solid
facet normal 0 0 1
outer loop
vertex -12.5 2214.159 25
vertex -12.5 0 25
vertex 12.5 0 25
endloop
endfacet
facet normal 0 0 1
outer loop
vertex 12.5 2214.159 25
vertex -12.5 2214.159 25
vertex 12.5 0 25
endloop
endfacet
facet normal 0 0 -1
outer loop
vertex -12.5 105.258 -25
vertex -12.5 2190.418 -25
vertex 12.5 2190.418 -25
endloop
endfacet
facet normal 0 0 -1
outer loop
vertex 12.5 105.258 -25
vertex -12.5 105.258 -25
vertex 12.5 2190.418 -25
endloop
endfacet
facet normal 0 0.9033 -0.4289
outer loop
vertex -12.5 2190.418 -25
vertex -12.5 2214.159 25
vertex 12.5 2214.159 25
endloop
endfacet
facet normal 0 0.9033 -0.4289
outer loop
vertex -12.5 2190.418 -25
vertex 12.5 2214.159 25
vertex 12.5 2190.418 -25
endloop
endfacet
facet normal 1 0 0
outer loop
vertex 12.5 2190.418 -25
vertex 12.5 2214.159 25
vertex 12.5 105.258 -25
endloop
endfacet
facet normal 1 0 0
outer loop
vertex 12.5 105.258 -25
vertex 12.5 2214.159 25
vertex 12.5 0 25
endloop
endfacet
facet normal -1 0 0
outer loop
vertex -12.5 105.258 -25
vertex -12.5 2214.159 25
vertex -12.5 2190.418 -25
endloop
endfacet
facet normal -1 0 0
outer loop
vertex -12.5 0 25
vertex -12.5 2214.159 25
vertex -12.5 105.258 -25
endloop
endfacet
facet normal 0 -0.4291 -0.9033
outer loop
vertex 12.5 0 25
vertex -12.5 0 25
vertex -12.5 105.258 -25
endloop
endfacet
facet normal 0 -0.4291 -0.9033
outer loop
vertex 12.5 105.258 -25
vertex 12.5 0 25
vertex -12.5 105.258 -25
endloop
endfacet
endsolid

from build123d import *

# Parameters (mm, degrees)
SKETCH_1_W          = 25
SKETCH_1_H          = 50
EXTRUDE_1_DEPTH     = 2214.15898255
CUT_EXTRUDE_2_DEPTH = 50
CUT_EXTRUDE_3_DEPTH = 50


with BuildPart() as part:
    # Эскиз1 → Бобышка-Вытянуть1 (new body)
    with BuildSketch(Plane(origin=(0, 0, 0), x_dir=(1, 0, 0), z_dir=(0, 1, 0))):
        Rectangle(SKETCH_1_W, SKETCH_1_H)
    extrude(amount=EXTRUDE_1_DEPTH)

    # Эскиз3 → Вырез-Вытянуть2 (cut)
    with BuildSketch(Plane.ZY.offset(12.5)):
        Polygon((25, 0), (-25, 105.257973095), (-25, 0), align=None)
    extrude(amount=-CUT_EXTRUDE_2_DEPTH, mode=Mode.SUBTRACT)

    # Эскиз4 → Вырез-Вытянуть3 (cut)
    with BuildSketch(Plane.ZY.offset(12.5)):
        Polygon((25, 2214.15898255), (-25, 2190.418247515), (-25, 2214.15898255), align=None)
    extrude(amount=-CUT_EXTRUDE_3_DEPTH, mode=Mode.SUBTRACT)


solid = part.part
